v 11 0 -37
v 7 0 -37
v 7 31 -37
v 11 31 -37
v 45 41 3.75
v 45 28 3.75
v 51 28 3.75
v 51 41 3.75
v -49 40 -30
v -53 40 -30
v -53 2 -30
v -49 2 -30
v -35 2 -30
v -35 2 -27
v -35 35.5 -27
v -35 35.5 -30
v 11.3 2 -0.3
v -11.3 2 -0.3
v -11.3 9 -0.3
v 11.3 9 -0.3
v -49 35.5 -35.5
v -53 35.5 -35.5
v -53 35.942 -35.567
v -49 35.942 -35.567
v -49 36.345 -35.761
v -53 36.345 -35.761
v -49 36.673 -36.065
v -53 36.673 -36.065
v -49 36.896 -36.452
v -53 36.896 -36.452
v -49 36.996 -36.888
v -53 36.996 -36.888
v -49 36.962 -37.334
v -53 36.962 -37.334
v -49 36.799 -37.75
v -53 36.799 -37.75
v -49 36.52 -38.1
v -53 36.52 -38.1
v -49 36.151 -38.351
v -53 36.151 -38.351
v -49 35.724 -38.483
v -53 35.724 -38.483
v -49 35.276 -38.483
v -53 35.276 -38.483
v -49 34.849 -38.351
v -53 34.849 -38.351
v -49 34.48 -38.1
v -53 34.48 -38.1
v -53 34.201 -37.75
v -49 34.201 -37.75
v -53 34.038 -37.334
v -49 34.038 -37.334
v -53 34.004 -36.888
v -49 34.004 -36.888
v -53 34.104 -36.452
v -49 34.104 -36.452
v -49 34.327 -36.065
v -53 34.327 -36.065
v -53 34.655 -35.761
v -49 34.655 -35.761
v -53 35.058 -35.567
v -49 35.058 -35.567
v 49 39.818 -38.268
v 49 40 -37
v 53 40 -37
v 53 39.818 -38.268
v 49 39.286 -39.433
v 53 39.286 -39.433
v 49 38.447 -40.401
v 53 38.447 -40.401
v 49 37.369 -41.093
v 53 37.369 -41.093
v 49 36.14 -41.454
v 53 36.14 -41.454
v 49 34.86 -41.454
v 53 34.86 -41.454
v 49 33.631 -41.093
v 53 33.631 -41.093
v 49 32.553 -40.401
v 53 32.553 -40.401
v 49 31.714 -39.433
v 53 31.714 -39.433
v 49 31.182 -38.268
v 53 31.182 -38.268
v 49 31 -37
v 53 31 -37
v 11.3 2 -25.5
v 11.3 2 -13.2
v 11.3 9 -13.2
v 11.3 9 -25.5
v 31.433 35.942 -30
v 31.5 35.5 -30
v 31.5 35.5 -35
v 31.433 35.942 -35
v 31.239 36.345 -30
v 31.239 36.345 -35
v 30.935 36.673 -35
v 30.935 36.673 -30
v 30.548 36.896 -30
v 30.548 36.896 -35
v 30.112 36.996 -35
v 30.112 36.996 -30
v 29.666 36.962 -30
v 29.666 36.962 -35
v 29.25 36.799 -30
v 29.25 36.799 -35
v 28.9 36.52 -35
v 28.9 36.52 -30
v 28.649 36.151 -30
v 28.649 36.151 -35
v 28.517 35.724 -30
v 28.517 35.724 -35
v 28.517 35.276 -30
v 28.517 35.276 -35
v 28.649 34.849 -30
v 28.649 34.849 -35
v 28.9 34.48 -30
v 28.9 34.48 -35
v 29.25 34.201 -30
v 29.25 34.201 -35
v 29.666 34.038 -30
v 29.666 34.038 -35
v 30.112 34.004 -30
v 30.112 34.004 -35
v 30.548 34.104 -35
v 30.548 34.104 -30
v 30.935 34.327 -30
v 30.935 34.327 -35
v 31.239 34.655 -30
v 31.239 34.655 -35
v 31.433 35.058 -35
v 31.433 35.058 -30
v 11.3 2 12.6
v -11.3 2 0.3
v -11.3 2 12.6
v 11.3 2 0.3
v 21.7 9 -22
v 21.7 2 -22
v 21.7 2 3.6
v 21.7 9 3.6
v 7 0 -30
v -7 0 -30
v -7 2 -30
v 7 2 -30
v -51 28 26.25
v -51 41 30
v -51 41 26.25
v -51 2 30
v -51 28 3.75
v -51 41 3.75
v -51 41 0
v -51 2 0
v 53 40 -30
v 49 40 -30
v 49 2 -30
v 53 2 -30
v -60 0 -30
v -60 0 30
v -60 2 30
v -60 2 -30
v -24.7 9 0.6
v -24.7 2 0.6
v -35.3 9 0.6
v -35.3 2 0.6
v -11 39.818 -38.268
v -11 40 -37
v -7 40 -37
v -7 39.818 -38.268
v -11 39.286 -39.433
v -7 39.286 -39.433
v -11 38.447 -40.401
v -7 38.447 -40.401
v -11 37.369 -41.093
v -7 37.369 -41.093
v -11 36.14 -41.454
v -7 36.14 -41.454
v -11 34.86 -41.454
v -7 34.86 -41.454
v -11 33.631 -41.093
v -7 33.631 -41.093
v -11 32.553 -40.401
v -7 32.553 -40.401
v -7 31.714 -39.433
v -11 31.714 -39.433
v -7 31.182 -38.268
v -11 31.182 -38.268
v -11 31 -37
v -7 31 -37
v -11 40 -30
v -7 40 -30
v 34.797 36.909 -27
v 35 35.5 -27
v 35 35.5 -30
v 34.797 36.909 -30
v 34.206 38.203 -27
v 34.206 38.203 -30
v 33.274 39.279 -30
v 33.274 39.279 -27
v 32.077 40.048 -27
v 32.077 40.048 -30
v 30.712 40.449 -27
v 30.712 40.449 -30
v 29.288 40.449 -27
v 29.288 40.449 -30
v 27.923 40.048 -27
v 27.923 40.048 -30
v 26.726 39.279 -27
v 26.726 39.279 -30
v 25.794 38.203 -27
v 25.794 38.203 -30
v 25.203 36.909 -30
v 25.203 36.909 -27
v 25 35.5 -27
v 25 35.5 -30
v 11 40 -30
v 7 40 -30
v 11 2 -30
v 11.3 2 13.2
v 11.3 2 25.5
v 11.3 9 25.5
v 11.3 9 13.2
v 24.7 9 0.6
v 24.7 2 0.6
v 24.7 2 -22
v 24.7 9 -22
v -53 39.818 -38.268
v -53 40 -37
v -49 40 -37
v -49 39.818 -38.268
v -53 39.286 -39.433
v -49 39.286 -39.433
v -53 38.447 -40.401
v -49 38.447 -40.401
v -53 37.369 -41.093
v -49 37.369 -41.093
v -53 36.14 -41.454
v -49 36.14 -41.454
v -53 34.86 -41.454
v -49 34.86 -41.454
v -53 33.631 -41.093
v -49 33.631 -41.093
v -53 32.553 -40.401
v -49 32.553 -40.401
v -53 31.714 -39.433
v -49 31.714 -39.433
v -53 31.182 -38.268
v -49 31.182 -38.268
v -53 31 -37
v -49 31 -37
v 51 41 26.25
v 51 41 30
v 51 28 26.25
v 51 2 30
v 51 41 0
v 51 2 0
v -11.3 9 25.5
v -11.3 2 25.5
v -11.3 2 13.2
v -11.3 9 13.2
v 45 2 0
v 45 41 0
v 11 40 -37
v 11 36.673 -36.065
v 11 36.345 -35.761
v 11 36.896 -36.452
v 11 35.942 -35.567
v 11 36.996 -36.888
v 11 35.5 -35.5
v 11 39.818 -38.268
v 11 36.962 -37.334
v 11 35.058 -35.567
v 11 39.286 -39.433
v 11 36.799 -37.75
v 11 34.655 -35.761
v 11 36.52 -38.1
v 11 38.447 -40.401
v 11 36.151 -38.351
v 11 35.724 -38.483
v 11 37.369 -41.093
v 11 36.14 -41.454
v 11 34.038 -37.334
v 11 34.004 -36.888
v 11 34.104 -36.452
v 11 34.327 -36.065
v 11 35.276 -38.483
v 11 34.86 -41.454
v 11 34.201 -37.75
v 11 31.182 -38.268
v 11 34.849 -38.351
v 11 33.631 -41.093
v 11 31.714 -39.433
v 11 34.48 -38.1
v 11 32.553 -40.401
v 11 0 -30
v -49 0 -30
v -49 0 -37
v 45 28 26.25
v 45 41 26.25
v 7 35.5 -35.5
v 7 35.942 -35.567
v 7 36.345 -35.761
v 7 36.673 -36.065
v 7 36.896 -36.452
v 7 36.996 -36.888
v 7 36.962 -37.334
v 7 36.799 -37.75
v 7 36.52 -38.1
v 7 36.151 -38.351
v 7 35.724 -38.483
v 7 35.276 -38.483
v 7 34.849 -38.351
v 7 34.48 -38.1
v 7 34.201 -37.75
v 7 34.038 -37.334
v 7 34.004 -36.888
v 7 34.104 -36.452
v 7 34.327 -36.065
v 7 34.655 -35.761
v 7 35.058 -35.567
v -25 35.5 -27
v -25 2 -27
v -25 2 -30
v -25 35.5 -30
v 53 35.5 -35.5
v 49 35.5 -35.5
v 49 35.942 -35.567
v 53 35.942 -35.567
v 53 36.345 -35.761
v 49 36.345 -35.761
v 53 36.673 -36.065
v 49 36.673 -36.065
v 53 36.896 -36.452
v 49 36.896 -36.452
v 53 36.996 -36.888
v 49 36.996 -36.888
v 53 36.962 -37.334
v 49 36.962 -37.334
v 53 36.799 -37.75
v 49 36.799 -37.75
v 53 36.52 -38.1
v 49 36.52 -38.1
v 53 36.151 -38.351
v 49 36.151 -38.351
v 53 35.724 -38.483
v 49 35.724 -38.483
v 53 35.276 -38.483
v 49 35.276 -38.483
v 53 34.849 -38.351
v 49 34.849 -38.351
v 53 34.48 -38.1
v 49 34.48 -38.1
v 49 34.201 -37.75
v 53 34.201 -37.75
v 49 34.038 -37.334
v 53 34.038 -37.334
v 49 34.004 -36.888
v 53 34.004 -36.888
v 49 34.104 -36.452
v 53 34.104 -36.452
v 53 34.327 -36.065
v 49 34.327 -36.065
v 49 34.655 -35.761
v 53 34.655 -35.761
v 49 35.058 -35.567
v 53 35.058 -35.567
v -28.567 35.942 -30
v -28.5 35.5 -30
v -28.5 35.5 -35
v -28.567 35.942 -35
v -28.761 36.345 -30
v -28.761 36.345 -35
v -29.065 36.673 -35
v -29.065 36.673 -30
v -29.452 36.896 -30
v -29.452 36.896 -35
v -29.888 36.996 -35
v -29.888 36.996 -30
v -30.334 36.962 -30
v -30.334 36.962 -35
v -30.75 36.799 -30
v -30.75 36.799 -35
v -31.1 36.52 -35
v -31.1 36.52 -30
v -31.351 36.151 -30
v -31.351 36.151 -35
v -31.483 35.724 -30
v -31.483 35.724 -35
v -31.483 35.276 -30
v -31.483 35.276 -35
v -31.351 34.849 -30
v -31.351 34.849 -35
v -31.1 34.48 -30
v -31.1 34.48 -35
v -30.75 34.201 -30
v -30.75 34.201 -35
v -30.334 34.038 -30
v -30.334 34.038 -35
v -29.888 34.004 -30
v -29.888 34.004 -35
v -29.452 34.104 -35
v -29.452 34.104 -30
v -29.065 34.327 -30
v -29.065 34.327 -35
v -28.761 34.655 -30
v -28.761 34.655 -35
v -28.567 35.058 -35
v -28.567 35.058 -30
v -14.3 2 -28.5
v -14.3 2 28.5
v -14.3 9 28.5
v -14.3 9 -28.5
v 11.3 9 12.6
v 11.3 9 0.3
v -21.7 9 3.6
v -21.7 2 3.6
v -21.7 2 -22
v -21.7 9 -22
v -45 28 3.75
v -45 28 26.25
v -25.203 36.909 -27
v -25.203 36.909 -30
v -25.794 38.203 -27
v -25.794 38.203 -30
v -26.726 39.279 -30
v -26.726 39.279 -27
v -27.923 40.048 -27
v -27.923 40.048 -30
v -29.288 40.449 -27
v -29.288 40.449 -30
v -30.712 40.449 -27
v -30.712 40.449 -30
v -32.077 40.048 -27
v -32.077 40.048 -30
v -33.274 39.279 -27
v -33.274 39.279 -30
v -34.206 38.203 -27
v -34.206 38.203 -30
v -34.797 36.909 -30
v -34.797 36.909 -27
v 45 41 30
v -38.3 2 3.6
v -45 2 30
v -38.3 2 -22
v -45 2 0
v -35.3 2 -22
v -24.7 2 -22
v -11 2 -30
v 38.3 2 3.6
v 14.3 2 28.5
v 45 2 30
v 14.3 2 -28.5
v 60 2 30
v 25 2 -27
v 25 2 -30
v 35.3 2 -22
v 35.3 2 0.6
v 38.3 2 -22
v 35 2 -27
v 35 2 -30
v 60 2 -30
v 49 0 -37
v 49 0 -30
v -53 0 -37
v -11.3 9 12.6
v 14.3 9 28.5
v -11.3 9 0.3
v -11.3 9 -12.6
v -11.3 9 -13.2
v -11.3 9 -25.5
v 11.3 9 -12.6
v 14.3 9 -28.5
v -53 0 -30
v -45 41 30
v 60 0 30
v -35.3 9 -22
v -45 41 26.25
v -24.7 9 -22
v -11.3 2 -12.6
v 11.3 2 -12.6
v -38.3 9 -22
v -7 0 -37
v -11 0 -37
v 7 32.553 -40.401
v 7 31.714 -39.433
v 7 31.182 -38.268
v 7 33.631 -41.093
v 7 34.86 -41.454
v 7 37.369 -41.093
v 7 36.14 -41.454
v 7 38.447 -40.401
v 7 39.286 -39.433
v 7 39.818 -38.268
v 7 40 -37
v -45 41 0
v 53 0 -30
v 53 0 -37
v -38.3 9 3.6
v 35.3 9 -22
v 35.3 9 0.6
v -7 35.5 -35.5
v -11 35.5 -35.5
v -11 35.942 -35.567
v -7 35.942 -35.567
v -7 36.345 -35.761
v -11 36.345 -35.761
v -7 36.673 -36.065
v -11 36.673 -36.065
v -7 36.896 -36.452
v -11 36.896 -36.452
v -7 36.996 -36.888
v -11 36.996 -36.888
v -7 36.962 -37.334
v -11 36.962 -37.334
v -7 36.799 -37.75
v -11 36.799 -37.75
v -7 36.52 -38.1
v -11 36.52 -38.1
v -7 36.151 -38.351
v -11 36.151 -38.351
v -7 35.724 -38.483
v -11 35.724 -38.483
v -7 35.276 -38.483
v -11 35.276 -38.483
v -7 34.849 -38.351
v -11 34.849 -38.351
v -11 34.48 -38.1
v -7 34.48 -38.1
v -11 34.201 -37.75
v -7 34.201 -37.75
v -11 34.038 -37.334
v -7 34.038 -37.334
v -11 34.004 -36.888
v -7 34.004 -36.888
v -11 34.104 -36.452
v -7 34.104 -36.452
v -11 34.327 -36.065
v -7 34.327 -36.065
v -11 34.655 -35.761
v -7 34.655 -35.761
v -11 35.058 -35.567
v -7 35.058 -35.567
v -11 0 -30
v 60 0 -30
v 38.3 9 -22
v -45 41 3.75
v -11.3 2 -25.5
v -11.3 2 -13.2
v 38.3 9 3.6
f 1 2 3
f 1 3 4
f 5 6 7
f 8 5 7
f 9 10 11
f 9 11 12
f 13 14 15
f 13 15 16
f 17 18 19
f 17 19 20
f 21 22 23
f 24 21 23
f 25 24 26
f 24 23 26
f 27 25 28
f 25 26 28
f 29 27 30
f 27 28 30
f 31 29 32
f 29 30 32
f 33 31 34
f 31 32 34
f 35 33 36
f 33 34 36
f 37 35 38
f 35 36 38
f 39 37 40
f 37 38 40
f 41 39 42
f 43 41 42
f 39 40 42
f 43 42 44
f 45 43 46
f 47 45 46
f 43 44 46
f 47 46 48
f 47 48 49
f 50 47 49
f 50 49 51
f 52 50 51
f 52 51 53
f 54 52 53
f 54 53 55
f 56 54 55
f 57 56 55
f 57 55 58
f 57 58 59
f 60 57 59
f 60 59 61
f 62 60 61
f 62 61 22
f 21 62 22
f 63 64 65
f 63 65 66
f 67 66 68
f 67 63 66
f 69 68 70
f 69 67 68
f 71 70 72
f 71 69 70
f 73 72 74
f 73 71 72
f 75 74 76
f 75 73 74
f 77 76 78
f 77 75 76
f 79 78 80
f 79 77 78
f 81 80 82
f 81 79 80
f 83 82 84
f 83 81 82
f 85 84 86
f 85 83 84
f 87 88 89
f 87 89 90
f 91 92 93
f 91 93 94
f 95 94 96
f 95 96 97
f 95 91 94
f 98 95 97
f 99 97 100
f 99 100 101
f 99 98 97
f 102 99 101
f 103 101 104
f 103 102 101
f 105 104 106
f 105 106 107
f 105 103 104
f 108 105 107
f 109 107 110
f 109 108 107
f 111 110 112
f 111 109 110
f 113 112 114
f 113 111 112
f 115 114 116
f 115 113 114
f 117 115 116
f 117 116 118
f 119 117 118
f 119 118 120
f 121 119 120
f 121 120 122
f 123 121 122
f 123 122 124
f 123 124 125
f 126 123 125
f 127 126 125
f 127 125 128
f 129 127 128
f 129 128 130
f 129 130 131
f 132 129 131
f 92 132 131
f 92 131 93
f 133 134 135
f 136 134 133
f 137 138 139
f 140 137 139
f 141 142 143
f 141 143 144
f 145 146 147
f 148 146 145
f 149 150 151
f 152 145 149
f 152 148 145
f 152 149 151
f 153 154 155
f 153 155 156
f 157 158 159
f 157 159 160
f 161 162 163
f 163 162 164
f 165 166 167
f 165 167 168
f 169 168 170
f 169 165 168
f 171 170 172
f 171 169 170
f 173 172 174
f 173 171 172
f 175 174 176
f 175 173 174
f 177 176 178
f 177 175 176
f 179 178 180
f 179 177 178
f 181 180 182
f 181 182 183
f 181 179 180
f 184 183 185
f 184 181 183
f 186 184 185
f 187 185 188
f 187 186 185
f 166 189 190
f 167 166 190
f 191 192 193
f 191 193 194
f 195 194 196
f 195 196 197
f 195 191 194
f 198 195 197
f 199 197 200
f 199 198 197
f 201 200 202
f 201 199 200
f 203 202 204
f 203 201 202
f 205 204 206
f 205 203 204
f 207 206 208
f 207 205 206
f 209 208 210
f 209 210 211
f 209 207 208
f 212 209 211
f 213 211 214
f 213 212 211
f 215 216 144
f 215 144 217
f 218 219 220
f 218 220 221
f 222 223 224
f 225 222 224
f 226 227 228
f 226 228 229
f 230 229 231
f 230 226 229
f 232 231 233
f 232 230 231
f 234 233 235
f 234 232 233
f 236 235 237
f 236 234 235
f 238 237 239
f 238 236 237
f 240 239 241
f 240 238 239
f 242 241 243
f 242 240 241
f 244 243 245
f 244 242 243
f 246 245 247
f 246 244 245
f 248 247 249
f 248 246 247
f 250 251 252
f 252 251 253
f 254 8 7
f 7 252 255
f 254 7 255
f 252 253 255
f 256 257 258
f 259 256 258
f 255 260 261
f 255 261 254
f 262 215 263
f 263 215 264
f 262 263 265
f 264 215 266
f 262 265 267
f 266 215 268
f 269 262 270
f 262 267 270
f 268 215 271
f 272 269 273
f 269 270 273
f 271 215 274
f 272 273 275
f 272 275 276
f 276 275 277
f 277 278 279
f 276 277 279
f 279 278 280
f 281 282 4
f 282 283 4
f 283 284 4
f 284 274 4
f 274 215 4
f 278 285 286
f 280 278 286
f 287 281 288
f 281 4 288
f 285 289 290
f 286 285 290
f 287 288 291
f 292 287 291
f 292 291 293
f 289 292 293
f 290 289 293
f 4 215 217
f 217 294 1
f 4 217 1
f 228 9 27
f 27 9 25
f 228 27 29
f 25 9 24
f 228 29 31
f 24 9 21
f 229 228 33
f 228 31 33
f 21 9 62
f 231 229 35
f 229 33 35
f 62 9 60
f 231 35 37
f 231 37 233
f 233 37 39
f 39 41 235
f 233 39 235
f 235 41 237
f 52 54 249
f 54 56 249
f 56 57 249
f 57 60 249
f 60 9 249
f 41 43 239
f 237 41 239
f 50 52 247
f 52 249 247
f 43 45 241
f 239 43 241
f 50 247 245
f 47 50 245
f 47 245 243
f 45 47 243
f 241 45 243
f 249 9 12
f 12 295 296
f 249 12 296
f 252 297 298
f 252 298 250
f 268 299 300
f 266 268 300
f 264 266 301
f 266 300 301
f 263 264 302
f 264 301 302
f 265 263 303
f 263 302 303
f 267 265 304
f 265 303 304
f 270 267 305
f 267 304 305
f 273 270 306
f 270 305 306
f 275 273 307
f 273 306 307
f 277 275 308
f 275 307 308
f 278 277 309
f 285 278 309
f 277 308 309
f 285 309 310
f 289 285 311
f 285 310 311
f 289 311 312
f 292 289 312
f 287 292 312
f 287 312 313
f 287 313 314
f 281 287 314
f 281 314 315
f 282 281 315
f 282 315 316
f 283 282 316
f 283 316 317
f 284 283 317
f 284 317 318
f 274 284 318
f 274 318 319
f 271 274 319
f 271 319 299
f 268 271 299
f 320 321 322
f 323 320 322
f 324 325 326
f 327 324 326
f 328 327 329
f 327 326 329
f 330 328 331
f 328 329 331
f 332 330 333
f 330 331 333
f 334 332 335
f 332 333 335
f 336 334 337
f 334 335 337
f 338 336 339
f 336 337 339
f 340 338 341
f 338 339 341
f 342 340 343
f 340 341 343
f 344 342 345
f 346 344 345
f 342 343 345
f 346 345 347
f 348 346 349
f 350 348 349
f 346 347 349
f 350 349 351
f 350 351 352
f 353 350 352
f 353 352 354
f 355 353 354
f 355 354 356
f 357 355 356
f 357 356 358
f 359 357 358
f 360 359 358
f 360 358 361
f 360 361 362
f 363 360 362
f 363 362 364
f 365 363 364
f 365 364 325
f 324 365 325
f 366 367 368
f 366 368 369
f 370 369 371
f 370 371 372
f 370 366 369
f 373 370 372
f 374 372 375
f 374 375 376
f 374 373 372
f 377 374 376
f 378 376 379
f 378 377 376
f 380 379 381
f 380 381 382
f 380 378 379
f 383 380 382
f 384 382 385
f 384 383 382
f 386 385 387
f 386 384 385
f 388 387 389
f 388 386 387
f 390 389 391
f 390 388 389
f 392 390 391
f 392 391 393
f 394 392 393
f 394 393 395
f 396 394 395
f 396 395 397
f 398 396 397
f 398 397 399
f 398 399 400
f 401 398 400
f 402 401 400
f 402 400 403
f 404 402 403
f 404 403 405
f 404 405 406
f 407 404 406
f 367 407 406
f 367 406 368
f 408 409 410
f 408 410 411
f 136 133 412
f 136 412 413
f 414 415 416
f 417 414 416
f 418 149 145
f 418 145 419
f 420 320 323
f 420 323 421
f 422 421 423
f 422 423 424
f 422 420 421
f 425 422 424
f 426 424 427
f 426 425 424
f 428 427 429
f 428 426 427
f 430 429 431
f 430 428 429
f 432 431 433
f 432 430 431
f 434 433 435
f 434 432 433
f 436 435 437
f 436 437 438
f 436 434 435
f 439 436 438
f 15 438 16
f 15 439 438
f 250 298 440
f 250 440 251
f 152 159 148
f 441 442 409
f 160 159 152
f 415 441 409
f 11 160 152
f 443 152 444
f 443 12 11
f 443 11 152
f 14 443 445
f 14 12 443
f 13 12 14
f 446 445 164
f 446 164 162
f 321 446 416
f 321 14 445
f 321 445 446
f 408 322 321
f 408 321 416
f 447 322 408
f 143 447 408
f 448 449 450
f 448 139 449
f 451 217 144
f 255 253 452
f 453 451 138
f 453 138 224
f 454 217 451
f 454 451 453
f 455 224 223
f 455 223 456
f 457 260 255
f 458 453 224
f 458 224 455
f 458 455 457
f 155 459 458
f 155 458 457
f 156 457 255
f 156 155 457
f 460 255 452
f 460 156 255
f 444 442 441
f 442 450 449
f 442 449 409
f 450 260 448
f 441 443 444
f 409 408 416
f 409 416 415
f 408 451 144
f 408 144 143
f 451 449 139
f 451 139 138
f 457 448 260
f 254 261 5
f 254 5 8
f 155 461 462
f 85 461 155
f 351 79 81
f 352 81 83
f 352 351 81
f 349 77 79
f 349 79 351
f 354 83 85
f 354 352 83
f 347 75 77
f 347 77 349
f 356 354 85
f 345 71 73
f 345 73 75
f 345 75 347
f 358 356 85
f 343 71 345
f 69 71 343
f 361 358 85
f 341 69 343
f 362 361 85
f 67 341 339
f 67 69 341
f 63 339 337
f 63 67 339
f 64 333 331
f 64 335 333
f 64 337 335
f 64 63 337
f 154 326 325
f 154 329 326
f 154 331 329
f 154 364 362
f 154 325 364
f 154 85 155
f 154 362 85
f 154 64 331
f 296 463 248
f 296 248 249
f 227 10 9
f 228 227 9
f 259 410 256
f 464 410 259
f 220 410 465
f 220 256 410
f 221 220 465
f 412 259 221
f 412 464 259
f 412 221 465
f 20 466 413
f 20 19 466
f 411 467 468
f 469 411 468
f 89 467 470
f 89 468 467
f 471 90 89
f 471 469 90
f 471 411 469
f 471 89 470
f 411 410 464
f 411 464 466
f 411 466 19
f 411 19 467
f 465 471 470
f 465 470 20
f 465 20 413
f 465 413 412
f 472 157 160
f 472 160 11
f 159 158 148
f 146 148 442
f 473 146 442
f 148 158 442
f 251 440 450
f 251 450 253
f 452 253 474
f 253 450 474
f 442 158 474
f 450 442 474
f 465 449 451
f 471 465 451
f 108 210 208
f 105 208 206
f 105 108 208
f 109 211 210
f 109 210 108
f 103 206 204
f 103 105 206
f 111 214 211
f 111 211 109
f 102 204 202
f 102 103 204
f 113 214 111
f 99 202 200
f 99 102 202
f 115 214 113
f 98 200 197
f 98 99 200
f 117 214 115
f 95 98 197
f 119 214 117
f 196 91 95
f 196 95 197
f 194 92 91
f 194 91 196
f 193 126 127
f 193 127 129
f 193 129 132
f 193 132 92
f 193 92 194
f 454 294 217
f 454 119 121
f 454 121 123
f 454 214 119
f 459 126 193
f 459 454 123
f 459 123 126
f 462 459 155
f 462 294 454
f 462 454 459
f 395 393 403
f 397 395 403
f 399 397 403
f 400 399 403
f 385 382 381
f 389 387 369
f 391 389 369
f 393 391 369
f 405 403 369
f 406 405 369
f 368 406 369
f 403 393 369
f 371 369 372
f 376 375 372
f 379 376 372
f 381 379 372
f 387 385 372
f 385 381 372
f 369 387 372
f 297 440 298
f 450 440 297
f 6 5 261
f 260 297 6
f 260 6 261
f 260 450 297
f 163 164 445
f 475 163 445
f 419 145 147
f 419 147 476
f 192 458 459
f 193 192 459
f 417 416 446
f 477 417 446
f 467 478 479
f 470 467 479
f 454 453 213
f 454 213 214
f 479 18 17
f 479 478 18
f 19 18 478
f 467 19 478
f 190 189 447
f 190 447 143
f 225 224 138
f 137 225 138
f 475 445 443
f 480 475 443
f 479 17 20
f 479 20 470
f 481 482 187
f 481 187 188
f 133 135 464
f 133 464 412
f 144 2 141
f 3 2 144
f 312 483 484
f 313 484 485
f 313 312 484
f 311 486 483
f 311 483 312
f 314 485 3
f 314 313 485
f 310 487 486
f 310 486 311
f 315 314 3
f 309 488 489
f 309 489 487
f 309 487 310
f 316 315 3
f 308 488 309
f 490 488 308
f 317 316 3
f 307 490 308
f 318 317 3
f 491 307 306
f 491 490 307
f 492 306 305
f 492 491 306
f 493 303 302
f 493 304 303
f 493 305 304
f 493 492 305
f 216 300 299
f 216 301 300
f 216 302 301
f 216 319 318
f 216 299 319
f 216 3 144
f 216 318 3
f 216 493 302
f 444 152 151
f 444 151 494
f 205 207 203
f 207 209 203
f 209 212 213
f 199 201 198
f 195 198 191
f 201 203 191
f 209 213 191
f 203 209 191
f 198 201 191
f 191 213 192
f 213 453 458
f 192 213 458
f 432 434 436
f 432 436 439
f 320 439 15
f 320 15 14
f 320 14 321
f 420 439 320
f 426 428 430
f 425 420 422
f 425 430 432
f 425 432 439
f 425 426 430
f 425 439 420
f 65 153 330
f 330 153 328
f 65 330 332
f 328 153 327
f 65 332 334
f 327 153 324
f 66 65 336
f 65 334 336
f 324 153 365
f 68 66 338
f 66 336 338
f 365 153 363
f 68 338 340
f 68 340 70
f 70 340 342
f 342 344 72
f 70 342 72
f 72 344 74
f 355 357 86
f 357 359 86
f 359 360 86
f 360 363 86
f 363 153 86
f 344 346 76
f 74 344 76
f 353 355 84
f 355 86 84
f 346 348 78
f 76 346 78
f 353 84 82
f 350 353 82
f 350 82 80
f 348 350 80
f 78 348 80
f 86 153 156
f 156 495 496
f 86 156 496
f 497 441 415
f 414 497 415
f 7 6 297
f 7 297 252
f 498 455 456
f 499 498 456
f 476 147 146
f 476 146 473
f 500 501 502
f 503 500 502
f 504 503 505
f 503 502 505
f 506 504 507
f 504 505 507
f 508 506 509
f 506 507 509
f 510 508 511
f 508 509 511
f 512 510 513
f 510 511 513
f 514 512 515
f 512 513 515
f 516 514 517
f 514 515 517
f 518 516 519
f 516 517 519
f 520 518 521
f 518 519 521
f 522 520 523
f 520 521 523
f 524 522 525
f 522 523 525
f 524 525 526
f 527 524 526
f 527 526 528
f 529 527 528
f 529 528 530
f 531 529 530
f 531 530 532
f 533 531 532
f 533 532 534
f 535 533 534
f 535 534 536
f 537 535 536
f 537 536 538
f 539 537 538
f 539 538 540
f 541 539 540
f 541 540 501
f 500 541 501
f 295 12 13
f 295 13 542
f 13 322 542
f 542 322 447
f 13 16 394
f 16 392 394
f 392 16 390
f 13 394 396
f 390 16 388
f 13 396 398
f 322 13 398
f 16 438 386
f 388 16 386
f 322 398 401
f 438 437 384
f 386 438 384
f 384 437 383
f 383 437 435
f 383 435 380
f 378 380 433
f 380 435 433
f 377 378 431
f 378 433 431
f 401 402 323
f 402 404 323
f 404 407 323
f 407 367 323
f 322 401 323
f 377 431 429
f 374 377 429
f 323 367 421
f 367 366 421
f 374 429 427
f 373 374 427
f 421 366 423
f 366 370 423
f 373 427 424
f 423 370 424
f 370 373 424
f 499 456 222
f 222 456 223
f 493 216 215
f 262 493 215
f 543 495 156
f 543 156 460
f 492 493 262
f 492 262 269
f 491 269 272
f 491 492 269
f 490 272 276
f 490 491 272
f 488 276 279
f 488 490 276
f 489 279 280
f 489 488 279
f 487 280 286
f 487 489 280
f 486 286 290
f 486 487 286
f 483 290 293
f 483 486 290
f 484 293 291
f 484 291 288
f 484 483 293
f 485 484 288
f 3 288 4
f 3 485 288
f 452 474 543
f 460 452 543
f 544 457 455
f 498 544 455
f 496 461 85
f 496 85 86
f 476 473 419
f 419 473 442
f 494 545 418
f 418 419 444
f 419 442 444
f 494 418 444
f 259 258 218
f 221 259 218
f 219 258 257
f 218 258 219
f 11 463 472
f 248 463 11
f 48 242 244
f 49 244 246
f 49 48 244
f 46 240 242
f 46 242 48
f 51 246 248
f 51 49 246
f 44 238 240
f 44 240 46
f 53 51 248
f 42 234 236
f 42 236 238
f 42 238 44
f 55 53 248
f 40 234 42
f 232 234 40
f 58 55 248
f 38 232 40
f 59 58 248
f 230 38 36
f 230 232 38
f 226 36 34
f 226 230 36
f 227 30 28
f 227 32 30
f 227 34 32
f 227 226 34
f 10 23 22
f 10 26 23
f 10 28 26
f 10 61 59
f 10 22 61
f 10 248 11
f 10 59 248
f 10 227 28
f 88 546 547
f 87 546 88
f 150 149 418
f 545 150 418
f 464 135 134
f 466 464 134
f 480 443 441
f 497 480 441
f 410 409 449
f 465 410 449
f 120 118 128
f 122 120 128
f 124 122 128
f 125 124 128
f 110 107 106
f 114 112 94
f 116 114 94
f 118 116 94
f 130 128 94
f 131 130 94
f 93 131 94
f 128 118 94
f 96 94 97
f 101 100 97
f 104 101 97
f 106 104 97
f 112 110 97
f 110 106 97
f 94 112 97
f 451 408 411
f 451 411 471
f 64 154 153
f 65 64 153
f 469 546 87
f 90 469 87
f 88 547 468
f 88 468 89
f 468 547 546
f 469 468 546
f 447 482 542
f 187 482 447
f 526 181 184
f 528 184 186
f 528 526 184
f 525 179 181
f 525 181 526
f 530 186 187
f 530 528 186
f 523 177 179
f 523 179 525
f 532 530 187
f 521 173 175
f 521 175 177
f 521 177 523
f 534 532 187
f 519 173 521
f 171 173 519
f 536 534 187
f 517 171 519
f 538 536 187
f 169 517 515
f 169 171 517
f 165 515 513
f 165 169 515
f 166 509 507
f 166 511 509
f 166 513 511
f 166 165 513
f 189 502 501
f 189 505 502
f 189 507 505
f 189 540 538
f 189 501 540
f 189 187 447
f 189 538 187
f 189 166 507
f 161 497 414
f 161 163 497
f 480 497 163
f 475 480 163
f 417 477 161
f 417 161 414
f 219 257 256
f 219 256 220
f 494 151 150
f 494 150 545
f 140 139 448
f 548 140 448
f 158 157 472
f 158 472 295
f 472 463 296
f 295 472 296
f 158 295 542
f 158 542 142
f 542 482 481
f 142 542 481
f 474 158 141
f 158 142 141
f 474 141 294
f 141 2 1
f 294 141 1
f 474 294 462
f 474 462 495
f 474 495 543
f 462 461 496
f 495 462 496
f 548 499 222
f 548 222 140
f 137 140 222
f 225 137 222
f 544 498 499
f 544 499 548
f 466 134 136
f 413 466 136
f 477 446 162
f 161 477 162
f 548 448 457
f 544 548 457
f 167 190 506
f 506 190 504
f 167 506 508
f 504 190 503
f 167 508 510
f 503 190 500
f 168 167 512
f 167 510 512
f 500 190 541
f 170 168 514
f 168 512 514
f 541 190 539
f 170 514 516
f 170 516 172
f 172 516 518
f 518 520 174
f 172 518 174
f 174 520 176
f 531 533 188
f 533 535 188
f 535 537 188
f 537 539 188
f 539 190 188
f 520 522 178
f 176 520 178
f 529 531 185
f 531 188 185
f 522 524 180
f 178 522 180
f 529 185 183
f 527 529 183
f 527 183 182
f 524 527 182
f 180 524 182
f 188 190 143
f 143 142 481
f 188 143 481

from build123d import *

# Parameters (mm, degrees)
BOSS_EXTRUDE1_DEPTH   = 9
BOSS_EXTRUDE1_2_DEPTH = 9
SKETCH1_3_W           = 6
SKETCH1_3_H           = 30
BOSS_EXTRUDE2_DEPTH   = 28
BOSS_EXTRUDE2_2_DEPTH = 28
SKETCH1_4_W           = 4
SKETCH1_4_H           = 7
BOSS_EXTRUDE3_DEPTH   = 40
BOSS_EXTRUDE3_2_DEPTH = 40
BOSS_EXTRUDE3_3_DEPTH = 40
BOSS_EXTRUDE3_4_DEPTH = 40
SKETCH1_5_W           = 10
SKETCH1_5_H           = 3
BOSS_EXTRUDE4_DEPTH   = 35.5
BOSS_EXTRUDE4_2_DEPTH = 35.5
SKETCH1_6_W           = 120
SKETCH1_6_H           = 60
BOSS_EXTRUDE5_DEPTH   = 2
SKETCH1_8_W           = 28.6
SKETCH1_8_H           = 57
SKETCH1_8_W_2         = 22.6
SKETCH1_8_H_2         = 51
BOSS_EXTRUDE6_DEPTH   = 9
SKETCH1_9_W           = 22.6
SKETCH1_9_H           = 0.6
BOSS_EXTRUDE7_DEPTH   = 9
SKETCH2_W             = 6
SKETCH2_H             = 3.75
BOSS_EXTRUDE8_DEPTH   = 13
BOSS_EXTRUDE9_DEPTH   = 3
SKETCH3_5_R           = 1.5
BOSS_EXTRUDE11_DEPTH  = 8
SKETCH4_R             = 4.5
SKETCH4_R_2           = 1.5
BOSS_EXTRUDE13_DEPTH  = 4
SKETCH4_4_R           = 1.5
CUT_EXTRUDE2_DEPTH    = 4
SKETCH5_R             = 4.5
SKETCH5_R_2           = 1.5
BOSS_EXTRUDE14_DEPTH  = 4
SKETCH5_2_R           = 1.5
CUT_EXTRUDE3_DEPTH    = 4
SKETCH7_R             = 4.5
SKETCH7_R_2           = 1.5
BOSS_EXTRUDE15_DEPTH  = 4
SKETCH7_2_R           = 1.5
CUT_EXTRUDE4_DEPTH    = 4
SKETCH8_R             = 4.5
SKETCH8_R_2           = 1.5
BOSS_EXTRUDE16_DEPTH  = 4
SKETCH8_4_R           = 1.5
CUT_EXTRUDE5_DEPTH    = 4


with BuildPart() as part:
    # Sketch1 → Boss-Extrude1 (new body)
    with BuildSketch(Plane(origin=(0, 0, 0), x_dir=(1, 0, 0), z_dir=(0, 1, 0))):
        Polygon((24.7, -0.6), (24.7, 22), (21.7, 22), (21.7, -3.6), (38.3, -3.6), (38.3, 22), (35.3, 22), (35.3, -0.6), align=None)
    extrude(amount=BOSS_EXTRUDE1_DEPTH)



with BuildPart() as body_2:
    # Sketch1 → Boss-Extrude1 2 (new body)
    with BuildSketch(Plane(origin=(0, 0, 0), x_dir=(1, 0, 0), z_dir=(0, 1, 0))):
        Polygon((-35.3, 22), (-38.3, 22), (-38.3, -3.6), (-21.7, -3.6), (-21.7, 22), (-24.7, 22), (-24.7, -0.6), (-35.3, -0.6), align=None)
    extrude(amount=BOSS_EXTRUDE1_2_DEPTH)


with BuildPart() as body_3:
    # Sketch1<3> → Boss-Extrude2 (new body)
    with BuildSketch(Plane(origin=(0, 0, 0), x_dir=(1, 0, 0), z_dir=(0, 1, 0))):
        with Locations((-48, -15)):
            Rectangle(SKETCH1_3_W, SKETCH1_3_H)
    extrude(amount=BOSS_EXTRUDE2_DEPTH)


with BuildPart() as body_4:
    # Sketch1<3> → Boss-Extrude2 2 (new body)
    with BuildSketch(Plane(origin=(0, 0, 0), x_dir=(1, 0, 0), z_dir=(0, 1, 0))):
        with Locations((48, -15)):
            Rectangle(SKETCH1_3_W, SKETCH1_3_H)
    extrude(amount=BOSS_EXTRUDE2_2_DEPTH)


with BuildPart() as body_5:
    # Sketch1<4> → Boss-Extrude3 (new body)
    with BuildSketch(Plane(origin=(0, 0, 0), x_dir=(1, 0, 0), z_dir=(0, 1, 0))):
        with Locations((-51, 33.5)):
            Rectangle(SKETCH1_4_W, SKETCH1_4_H)
    extrude(amount=BOSS_EXTRUDE3_DEPTH)


with BuildPart() as body_6:
    # Sketch1<4> → Boss-Extrude3 2 (new body)
    with BuildSketch(Plane(origin=(0, 0, 0), x_dir=(1, 0, 0), z_dir=(0, 1, 0))):
        with Locations((-9, 33.5)):
            Rectangle(SKETCH1_4_W, SKETCH1_4_H)
    extrude(amount=BOSS_EXTRUDE3_2_DEPTH)


with BuildPart() as body_7:
    # Sketch1<4> → Boss-Extrude3 3 (new body)
    with BuildSketch(Plane(origin=(0, 0, 0), x_dir=(1, 0, 0), z_dir=(0, 1, 0))):
        with Locations((9, 33.5)):
            Rectangle(SKETCH1_4_W, SKETCH1_4_H)
    extrude(amount=BOSS_EXTRUDE3_3_DEPTH)


with BuildPart() as body_8:
    # Sketch1<4> → Boss-Extrude3 4 (new body)
    with BuildSketch(Plane(origin=(0, 0, 0), x_dir=(1, 0, 0), z_dir=(0, 1, 0))):
        with Locations((51, 33.5)):
            Rectangle(SKETCH1_4_W, SKETCH1_4_H)
    extrude(amount=BOSS_EXTRUDE3_4_DEPTH)


with BuildPart() as body_9:
    # Sketch1<5> → Boss-Extrude4 (new body)
    with BuildSketch(Plane(origin=(0, 0, 0), x_dir=(1, 0, 0), z_dir=(0, 1, 0))):
        with Locations((30, 28.5)):
            Rectangle(SKETCH1_5_W, SKETCH1_5_H)
    extrude(amount=BOSS_EXTRUDE4_DEPTH)


with BuildPart() as body_10:
    # Sketch1<5> → Boss-Extrude4 2 (new body)
    with BuildSketch(Plane(origin=(0, 0, 0), x_dir=(1, 0, 0), z_dir=(0, 1, 0))):
        with Locations((-30, 28.5)):
            Rectangle(SKETCH1_5_W, SKETCH1_5_H)
    extrude(amount=BOSS_EXTRUDE4_2_DEPTH)


with BuildPart() as part_1:
    add(part.part)

    add(body_2.part)  # Boss-Extrude5 merges body 2

    add(body_3.part)  # Boss-Extrude5 merges body 3

    add(body_4.part)  # Boss-Extrude5 merges body 4

    add(body_5.part)  # Boss-Extrude5 merges body 5

    add(body_6.part)  # Boss-Extrude5 merges body 6

    add(body_7.part)  # Boss-Extrude5 merges body 7

    add(body_8.part)  # Boss-Extrude5 merges body 8

    add(body_9.part)  # Boss-Extrude5 merges body 9

    add(body_10.part)  # Boss-Extrude5 merges body 10
    # Sketch1<6> → Boss-Extrude5 (add)
    with BuildSketch(Plane(origin=(0, 0, 0), x_dir=(1, 0, 0), z_dir=(0, 1, 0))):
        Rectangle(SKETCH1_6_W, SKETCH1_6_H)
    extrude(amount=BOSS_EXTRUDE5_DEPTH)

    # Sketch1<8> → Boss-Extrude6 (add)
    with BuildSketch(Plane(origin=(0, 0, 0), x_dir=(1, 0, 0), z_dir=(0, 1, 0))):
        Rectangle(SKETCH1_8_W, SKETCH1_8_H)
        Rectangle(SKETCH1_8_W_2, SKETCH1_8_H_2, mode=Mode.SUBTRACT)
    extrude(amount=BOSS_EXTRUDE6_DEPTH)

    # Sketch1<9> → Boss-Extrude7 (add)
    with BuildSketch(Plane(origin=(0, 0, 0), x_dir=(1, 0, 0), z_dir=(0, 1, 0))):
        with Locations((0, 12.9)):
            Rectangle(SKETCH1_9_W, SKETCH1_9_H)
        Rectangle(SKETCH1_9_W, SKETCH1_9_H)
        with Locations((0, -12.9)):
            Rectangle(SKETCH1_9_W, SKETCH1_9_H)
    extrude(amount=BOSS_EXTRUDE7_DEPTH)

    # Sketch2 → Boss-Extrude8 (add)
    with BuildSketch(Plane(origin=(0, 28, 0), x_dir=(1, 0, 0), z_dir=(0, 1, 0))):
        with Locations((-48, -1.875)):
            Rectangle(SKETCH2_W, SKETCH2_H)
        with Locations((-48, -28.125)):
            Rectangle(SKETCH2_W, SKETCH2_H)
        with Locations((48, -1.875)):
            Rectangle(SKETCH2_W, SKETCH2_H)
        with Locations((48, -28.125)):
            Rectangle(SKETCH2_W, SKETCH2_H)
    extrude(amount=BOSS_EXTRUDE8_DEPTH)

    # Sketch3 → Boss-Extrude9 (add)
    with BuildSketch(Plane.XY.offset(-27)):
        with BuildLine():
            ThreePointArc((-31.5, 35.5), (-30, 37), (-28.5, 35.5))
            Line((-28.5, 35.5), (-25, 35.5))
            ThreePointArc((-25, 35.5), (-30, 40.5), (-35, 35.5))
            Line((-35, 35.5), (-31.5, 35.5))
        make_face()
        with BuildLine():
            ThreePointArc((28.5, 35.5), (30, 37), (31.5, 35.5))
            Line((31.5, 35.5), (35, 35.5))
            ThreePointArc((35, 35.5), (30, 40.5), (25, 35.5))
            Line((25, 35.5), (28.5, 35.5))
        make_face()
    extrude(amount=-BOSS_EXTRUDE9_DEPTH)

    # Sketch3<5> → Boss-Extrude11 (add)
    with BuildSketch(Plane.XY.offset(-27)):
        with Locations((-30, 35.5)):
            Circle(SKETCH3_5_R)
        with Locations((30, 35.5)):
            Circle(SKETCH3_5_R)
    extrude(amount=-BOSS_EXTRUDE11_DEPTH)

    # Sketch4 → Boss-Extrude13 (add)
    with BuildSketch(Plane.ZY.offset(53)):
        with Locations((-37, 35.5)):
            Circle(SKETCH4_R)
        with Locations((-37, 35.5)):
            Circle(SKETCH4_R_2, mode=Mode.SUBTRACT)
    extrude(amount=-BOSS_EXTRUDE13_DEPTH)

    # Sketch4<4> → Cut-Extrude2 (cut)
    with BuildSketch(Plane.ZY.offset(53)):
        with Locations((-37, 35.5)):
            Circle(SKETCH4_4_R)
    extrude(amount=-CUT_EXTRUDE2_DEPTH, mode=Mode.SUBTRACT)

    # Sketch5 → Boss-Extrude14 (add)
    with BuildSketch(Plane.ZY.offset(11)):
        with Locations((-37, 35.5)):
            Circle(SKETCH5_R)
        with Locations((-37, 35.5)):
            Circle(SKETCH5_R_2, mode=Mode.SUBTRACT)
    extrude(amount=-BOSS_EXTRUDE14_DEPTH)

    # Sketch5<2> → Cut-Extrude3 (cut)
    with BuildSketch(Plane.ZY.offset(11)):
        with Locations((-37, 35.5)):
            Circle(SKETCH5_2_R)
    extrude(amount=-CUT_EXTRUDE3_DEPTH, mode=Mode.SUBTRACT)

    # Sketch7 → Boss-Extrude15 (add)
    with BuildSketch(Plane.ZY.offset(-7)):
        with Locations((-37, 35.5)):
            Circle(SKETCH7_R)
        with Locations((-37, 35.5)):
            Circle(SKETCH7_R_2, mode=Mode.SUBTRACT)
    extrude(amount=-BOSS_EXTRUDE15_DEPTH)

    # Sketch7<2> → Cut-Extrude4 (cut)
    with BuildSketch(Plane.ZY.offset(-7)):
        with Locations((-37, 35.5)):
            Circle(SKETCH7_2_R)
    extrude(amount=-CUT_EXTRUDE4_DEPTH, mode=Mode.SUBTRACT)

    # Sketch8 → Boss-Extrude16 (add)
    with BuildSketch(Plane.ZY.offset(-49)):
        with Locations((-37, 35.5)):
            Circle(SKETCH8_R)
        with Locations((-37, 35.5)):
            Circle(SKETCH8_R_2, mode=Mode.SUBTRACT)
    extrude(amount=-BOSS_EXTRUDE16_DEPTH)

    # Sketch8<4> → Cut-Extrude5 (cut)
    with BuildSketch(Plane.ZY.offset(-49)):
        with Locations((-37, 35.5)):
            Circle(SKETCH8_4_R)
    extrude(amount=-CUT_EXTRUDE5_DEPTH, mode=Mode.SUBTRACT)


solid = part_1.part
